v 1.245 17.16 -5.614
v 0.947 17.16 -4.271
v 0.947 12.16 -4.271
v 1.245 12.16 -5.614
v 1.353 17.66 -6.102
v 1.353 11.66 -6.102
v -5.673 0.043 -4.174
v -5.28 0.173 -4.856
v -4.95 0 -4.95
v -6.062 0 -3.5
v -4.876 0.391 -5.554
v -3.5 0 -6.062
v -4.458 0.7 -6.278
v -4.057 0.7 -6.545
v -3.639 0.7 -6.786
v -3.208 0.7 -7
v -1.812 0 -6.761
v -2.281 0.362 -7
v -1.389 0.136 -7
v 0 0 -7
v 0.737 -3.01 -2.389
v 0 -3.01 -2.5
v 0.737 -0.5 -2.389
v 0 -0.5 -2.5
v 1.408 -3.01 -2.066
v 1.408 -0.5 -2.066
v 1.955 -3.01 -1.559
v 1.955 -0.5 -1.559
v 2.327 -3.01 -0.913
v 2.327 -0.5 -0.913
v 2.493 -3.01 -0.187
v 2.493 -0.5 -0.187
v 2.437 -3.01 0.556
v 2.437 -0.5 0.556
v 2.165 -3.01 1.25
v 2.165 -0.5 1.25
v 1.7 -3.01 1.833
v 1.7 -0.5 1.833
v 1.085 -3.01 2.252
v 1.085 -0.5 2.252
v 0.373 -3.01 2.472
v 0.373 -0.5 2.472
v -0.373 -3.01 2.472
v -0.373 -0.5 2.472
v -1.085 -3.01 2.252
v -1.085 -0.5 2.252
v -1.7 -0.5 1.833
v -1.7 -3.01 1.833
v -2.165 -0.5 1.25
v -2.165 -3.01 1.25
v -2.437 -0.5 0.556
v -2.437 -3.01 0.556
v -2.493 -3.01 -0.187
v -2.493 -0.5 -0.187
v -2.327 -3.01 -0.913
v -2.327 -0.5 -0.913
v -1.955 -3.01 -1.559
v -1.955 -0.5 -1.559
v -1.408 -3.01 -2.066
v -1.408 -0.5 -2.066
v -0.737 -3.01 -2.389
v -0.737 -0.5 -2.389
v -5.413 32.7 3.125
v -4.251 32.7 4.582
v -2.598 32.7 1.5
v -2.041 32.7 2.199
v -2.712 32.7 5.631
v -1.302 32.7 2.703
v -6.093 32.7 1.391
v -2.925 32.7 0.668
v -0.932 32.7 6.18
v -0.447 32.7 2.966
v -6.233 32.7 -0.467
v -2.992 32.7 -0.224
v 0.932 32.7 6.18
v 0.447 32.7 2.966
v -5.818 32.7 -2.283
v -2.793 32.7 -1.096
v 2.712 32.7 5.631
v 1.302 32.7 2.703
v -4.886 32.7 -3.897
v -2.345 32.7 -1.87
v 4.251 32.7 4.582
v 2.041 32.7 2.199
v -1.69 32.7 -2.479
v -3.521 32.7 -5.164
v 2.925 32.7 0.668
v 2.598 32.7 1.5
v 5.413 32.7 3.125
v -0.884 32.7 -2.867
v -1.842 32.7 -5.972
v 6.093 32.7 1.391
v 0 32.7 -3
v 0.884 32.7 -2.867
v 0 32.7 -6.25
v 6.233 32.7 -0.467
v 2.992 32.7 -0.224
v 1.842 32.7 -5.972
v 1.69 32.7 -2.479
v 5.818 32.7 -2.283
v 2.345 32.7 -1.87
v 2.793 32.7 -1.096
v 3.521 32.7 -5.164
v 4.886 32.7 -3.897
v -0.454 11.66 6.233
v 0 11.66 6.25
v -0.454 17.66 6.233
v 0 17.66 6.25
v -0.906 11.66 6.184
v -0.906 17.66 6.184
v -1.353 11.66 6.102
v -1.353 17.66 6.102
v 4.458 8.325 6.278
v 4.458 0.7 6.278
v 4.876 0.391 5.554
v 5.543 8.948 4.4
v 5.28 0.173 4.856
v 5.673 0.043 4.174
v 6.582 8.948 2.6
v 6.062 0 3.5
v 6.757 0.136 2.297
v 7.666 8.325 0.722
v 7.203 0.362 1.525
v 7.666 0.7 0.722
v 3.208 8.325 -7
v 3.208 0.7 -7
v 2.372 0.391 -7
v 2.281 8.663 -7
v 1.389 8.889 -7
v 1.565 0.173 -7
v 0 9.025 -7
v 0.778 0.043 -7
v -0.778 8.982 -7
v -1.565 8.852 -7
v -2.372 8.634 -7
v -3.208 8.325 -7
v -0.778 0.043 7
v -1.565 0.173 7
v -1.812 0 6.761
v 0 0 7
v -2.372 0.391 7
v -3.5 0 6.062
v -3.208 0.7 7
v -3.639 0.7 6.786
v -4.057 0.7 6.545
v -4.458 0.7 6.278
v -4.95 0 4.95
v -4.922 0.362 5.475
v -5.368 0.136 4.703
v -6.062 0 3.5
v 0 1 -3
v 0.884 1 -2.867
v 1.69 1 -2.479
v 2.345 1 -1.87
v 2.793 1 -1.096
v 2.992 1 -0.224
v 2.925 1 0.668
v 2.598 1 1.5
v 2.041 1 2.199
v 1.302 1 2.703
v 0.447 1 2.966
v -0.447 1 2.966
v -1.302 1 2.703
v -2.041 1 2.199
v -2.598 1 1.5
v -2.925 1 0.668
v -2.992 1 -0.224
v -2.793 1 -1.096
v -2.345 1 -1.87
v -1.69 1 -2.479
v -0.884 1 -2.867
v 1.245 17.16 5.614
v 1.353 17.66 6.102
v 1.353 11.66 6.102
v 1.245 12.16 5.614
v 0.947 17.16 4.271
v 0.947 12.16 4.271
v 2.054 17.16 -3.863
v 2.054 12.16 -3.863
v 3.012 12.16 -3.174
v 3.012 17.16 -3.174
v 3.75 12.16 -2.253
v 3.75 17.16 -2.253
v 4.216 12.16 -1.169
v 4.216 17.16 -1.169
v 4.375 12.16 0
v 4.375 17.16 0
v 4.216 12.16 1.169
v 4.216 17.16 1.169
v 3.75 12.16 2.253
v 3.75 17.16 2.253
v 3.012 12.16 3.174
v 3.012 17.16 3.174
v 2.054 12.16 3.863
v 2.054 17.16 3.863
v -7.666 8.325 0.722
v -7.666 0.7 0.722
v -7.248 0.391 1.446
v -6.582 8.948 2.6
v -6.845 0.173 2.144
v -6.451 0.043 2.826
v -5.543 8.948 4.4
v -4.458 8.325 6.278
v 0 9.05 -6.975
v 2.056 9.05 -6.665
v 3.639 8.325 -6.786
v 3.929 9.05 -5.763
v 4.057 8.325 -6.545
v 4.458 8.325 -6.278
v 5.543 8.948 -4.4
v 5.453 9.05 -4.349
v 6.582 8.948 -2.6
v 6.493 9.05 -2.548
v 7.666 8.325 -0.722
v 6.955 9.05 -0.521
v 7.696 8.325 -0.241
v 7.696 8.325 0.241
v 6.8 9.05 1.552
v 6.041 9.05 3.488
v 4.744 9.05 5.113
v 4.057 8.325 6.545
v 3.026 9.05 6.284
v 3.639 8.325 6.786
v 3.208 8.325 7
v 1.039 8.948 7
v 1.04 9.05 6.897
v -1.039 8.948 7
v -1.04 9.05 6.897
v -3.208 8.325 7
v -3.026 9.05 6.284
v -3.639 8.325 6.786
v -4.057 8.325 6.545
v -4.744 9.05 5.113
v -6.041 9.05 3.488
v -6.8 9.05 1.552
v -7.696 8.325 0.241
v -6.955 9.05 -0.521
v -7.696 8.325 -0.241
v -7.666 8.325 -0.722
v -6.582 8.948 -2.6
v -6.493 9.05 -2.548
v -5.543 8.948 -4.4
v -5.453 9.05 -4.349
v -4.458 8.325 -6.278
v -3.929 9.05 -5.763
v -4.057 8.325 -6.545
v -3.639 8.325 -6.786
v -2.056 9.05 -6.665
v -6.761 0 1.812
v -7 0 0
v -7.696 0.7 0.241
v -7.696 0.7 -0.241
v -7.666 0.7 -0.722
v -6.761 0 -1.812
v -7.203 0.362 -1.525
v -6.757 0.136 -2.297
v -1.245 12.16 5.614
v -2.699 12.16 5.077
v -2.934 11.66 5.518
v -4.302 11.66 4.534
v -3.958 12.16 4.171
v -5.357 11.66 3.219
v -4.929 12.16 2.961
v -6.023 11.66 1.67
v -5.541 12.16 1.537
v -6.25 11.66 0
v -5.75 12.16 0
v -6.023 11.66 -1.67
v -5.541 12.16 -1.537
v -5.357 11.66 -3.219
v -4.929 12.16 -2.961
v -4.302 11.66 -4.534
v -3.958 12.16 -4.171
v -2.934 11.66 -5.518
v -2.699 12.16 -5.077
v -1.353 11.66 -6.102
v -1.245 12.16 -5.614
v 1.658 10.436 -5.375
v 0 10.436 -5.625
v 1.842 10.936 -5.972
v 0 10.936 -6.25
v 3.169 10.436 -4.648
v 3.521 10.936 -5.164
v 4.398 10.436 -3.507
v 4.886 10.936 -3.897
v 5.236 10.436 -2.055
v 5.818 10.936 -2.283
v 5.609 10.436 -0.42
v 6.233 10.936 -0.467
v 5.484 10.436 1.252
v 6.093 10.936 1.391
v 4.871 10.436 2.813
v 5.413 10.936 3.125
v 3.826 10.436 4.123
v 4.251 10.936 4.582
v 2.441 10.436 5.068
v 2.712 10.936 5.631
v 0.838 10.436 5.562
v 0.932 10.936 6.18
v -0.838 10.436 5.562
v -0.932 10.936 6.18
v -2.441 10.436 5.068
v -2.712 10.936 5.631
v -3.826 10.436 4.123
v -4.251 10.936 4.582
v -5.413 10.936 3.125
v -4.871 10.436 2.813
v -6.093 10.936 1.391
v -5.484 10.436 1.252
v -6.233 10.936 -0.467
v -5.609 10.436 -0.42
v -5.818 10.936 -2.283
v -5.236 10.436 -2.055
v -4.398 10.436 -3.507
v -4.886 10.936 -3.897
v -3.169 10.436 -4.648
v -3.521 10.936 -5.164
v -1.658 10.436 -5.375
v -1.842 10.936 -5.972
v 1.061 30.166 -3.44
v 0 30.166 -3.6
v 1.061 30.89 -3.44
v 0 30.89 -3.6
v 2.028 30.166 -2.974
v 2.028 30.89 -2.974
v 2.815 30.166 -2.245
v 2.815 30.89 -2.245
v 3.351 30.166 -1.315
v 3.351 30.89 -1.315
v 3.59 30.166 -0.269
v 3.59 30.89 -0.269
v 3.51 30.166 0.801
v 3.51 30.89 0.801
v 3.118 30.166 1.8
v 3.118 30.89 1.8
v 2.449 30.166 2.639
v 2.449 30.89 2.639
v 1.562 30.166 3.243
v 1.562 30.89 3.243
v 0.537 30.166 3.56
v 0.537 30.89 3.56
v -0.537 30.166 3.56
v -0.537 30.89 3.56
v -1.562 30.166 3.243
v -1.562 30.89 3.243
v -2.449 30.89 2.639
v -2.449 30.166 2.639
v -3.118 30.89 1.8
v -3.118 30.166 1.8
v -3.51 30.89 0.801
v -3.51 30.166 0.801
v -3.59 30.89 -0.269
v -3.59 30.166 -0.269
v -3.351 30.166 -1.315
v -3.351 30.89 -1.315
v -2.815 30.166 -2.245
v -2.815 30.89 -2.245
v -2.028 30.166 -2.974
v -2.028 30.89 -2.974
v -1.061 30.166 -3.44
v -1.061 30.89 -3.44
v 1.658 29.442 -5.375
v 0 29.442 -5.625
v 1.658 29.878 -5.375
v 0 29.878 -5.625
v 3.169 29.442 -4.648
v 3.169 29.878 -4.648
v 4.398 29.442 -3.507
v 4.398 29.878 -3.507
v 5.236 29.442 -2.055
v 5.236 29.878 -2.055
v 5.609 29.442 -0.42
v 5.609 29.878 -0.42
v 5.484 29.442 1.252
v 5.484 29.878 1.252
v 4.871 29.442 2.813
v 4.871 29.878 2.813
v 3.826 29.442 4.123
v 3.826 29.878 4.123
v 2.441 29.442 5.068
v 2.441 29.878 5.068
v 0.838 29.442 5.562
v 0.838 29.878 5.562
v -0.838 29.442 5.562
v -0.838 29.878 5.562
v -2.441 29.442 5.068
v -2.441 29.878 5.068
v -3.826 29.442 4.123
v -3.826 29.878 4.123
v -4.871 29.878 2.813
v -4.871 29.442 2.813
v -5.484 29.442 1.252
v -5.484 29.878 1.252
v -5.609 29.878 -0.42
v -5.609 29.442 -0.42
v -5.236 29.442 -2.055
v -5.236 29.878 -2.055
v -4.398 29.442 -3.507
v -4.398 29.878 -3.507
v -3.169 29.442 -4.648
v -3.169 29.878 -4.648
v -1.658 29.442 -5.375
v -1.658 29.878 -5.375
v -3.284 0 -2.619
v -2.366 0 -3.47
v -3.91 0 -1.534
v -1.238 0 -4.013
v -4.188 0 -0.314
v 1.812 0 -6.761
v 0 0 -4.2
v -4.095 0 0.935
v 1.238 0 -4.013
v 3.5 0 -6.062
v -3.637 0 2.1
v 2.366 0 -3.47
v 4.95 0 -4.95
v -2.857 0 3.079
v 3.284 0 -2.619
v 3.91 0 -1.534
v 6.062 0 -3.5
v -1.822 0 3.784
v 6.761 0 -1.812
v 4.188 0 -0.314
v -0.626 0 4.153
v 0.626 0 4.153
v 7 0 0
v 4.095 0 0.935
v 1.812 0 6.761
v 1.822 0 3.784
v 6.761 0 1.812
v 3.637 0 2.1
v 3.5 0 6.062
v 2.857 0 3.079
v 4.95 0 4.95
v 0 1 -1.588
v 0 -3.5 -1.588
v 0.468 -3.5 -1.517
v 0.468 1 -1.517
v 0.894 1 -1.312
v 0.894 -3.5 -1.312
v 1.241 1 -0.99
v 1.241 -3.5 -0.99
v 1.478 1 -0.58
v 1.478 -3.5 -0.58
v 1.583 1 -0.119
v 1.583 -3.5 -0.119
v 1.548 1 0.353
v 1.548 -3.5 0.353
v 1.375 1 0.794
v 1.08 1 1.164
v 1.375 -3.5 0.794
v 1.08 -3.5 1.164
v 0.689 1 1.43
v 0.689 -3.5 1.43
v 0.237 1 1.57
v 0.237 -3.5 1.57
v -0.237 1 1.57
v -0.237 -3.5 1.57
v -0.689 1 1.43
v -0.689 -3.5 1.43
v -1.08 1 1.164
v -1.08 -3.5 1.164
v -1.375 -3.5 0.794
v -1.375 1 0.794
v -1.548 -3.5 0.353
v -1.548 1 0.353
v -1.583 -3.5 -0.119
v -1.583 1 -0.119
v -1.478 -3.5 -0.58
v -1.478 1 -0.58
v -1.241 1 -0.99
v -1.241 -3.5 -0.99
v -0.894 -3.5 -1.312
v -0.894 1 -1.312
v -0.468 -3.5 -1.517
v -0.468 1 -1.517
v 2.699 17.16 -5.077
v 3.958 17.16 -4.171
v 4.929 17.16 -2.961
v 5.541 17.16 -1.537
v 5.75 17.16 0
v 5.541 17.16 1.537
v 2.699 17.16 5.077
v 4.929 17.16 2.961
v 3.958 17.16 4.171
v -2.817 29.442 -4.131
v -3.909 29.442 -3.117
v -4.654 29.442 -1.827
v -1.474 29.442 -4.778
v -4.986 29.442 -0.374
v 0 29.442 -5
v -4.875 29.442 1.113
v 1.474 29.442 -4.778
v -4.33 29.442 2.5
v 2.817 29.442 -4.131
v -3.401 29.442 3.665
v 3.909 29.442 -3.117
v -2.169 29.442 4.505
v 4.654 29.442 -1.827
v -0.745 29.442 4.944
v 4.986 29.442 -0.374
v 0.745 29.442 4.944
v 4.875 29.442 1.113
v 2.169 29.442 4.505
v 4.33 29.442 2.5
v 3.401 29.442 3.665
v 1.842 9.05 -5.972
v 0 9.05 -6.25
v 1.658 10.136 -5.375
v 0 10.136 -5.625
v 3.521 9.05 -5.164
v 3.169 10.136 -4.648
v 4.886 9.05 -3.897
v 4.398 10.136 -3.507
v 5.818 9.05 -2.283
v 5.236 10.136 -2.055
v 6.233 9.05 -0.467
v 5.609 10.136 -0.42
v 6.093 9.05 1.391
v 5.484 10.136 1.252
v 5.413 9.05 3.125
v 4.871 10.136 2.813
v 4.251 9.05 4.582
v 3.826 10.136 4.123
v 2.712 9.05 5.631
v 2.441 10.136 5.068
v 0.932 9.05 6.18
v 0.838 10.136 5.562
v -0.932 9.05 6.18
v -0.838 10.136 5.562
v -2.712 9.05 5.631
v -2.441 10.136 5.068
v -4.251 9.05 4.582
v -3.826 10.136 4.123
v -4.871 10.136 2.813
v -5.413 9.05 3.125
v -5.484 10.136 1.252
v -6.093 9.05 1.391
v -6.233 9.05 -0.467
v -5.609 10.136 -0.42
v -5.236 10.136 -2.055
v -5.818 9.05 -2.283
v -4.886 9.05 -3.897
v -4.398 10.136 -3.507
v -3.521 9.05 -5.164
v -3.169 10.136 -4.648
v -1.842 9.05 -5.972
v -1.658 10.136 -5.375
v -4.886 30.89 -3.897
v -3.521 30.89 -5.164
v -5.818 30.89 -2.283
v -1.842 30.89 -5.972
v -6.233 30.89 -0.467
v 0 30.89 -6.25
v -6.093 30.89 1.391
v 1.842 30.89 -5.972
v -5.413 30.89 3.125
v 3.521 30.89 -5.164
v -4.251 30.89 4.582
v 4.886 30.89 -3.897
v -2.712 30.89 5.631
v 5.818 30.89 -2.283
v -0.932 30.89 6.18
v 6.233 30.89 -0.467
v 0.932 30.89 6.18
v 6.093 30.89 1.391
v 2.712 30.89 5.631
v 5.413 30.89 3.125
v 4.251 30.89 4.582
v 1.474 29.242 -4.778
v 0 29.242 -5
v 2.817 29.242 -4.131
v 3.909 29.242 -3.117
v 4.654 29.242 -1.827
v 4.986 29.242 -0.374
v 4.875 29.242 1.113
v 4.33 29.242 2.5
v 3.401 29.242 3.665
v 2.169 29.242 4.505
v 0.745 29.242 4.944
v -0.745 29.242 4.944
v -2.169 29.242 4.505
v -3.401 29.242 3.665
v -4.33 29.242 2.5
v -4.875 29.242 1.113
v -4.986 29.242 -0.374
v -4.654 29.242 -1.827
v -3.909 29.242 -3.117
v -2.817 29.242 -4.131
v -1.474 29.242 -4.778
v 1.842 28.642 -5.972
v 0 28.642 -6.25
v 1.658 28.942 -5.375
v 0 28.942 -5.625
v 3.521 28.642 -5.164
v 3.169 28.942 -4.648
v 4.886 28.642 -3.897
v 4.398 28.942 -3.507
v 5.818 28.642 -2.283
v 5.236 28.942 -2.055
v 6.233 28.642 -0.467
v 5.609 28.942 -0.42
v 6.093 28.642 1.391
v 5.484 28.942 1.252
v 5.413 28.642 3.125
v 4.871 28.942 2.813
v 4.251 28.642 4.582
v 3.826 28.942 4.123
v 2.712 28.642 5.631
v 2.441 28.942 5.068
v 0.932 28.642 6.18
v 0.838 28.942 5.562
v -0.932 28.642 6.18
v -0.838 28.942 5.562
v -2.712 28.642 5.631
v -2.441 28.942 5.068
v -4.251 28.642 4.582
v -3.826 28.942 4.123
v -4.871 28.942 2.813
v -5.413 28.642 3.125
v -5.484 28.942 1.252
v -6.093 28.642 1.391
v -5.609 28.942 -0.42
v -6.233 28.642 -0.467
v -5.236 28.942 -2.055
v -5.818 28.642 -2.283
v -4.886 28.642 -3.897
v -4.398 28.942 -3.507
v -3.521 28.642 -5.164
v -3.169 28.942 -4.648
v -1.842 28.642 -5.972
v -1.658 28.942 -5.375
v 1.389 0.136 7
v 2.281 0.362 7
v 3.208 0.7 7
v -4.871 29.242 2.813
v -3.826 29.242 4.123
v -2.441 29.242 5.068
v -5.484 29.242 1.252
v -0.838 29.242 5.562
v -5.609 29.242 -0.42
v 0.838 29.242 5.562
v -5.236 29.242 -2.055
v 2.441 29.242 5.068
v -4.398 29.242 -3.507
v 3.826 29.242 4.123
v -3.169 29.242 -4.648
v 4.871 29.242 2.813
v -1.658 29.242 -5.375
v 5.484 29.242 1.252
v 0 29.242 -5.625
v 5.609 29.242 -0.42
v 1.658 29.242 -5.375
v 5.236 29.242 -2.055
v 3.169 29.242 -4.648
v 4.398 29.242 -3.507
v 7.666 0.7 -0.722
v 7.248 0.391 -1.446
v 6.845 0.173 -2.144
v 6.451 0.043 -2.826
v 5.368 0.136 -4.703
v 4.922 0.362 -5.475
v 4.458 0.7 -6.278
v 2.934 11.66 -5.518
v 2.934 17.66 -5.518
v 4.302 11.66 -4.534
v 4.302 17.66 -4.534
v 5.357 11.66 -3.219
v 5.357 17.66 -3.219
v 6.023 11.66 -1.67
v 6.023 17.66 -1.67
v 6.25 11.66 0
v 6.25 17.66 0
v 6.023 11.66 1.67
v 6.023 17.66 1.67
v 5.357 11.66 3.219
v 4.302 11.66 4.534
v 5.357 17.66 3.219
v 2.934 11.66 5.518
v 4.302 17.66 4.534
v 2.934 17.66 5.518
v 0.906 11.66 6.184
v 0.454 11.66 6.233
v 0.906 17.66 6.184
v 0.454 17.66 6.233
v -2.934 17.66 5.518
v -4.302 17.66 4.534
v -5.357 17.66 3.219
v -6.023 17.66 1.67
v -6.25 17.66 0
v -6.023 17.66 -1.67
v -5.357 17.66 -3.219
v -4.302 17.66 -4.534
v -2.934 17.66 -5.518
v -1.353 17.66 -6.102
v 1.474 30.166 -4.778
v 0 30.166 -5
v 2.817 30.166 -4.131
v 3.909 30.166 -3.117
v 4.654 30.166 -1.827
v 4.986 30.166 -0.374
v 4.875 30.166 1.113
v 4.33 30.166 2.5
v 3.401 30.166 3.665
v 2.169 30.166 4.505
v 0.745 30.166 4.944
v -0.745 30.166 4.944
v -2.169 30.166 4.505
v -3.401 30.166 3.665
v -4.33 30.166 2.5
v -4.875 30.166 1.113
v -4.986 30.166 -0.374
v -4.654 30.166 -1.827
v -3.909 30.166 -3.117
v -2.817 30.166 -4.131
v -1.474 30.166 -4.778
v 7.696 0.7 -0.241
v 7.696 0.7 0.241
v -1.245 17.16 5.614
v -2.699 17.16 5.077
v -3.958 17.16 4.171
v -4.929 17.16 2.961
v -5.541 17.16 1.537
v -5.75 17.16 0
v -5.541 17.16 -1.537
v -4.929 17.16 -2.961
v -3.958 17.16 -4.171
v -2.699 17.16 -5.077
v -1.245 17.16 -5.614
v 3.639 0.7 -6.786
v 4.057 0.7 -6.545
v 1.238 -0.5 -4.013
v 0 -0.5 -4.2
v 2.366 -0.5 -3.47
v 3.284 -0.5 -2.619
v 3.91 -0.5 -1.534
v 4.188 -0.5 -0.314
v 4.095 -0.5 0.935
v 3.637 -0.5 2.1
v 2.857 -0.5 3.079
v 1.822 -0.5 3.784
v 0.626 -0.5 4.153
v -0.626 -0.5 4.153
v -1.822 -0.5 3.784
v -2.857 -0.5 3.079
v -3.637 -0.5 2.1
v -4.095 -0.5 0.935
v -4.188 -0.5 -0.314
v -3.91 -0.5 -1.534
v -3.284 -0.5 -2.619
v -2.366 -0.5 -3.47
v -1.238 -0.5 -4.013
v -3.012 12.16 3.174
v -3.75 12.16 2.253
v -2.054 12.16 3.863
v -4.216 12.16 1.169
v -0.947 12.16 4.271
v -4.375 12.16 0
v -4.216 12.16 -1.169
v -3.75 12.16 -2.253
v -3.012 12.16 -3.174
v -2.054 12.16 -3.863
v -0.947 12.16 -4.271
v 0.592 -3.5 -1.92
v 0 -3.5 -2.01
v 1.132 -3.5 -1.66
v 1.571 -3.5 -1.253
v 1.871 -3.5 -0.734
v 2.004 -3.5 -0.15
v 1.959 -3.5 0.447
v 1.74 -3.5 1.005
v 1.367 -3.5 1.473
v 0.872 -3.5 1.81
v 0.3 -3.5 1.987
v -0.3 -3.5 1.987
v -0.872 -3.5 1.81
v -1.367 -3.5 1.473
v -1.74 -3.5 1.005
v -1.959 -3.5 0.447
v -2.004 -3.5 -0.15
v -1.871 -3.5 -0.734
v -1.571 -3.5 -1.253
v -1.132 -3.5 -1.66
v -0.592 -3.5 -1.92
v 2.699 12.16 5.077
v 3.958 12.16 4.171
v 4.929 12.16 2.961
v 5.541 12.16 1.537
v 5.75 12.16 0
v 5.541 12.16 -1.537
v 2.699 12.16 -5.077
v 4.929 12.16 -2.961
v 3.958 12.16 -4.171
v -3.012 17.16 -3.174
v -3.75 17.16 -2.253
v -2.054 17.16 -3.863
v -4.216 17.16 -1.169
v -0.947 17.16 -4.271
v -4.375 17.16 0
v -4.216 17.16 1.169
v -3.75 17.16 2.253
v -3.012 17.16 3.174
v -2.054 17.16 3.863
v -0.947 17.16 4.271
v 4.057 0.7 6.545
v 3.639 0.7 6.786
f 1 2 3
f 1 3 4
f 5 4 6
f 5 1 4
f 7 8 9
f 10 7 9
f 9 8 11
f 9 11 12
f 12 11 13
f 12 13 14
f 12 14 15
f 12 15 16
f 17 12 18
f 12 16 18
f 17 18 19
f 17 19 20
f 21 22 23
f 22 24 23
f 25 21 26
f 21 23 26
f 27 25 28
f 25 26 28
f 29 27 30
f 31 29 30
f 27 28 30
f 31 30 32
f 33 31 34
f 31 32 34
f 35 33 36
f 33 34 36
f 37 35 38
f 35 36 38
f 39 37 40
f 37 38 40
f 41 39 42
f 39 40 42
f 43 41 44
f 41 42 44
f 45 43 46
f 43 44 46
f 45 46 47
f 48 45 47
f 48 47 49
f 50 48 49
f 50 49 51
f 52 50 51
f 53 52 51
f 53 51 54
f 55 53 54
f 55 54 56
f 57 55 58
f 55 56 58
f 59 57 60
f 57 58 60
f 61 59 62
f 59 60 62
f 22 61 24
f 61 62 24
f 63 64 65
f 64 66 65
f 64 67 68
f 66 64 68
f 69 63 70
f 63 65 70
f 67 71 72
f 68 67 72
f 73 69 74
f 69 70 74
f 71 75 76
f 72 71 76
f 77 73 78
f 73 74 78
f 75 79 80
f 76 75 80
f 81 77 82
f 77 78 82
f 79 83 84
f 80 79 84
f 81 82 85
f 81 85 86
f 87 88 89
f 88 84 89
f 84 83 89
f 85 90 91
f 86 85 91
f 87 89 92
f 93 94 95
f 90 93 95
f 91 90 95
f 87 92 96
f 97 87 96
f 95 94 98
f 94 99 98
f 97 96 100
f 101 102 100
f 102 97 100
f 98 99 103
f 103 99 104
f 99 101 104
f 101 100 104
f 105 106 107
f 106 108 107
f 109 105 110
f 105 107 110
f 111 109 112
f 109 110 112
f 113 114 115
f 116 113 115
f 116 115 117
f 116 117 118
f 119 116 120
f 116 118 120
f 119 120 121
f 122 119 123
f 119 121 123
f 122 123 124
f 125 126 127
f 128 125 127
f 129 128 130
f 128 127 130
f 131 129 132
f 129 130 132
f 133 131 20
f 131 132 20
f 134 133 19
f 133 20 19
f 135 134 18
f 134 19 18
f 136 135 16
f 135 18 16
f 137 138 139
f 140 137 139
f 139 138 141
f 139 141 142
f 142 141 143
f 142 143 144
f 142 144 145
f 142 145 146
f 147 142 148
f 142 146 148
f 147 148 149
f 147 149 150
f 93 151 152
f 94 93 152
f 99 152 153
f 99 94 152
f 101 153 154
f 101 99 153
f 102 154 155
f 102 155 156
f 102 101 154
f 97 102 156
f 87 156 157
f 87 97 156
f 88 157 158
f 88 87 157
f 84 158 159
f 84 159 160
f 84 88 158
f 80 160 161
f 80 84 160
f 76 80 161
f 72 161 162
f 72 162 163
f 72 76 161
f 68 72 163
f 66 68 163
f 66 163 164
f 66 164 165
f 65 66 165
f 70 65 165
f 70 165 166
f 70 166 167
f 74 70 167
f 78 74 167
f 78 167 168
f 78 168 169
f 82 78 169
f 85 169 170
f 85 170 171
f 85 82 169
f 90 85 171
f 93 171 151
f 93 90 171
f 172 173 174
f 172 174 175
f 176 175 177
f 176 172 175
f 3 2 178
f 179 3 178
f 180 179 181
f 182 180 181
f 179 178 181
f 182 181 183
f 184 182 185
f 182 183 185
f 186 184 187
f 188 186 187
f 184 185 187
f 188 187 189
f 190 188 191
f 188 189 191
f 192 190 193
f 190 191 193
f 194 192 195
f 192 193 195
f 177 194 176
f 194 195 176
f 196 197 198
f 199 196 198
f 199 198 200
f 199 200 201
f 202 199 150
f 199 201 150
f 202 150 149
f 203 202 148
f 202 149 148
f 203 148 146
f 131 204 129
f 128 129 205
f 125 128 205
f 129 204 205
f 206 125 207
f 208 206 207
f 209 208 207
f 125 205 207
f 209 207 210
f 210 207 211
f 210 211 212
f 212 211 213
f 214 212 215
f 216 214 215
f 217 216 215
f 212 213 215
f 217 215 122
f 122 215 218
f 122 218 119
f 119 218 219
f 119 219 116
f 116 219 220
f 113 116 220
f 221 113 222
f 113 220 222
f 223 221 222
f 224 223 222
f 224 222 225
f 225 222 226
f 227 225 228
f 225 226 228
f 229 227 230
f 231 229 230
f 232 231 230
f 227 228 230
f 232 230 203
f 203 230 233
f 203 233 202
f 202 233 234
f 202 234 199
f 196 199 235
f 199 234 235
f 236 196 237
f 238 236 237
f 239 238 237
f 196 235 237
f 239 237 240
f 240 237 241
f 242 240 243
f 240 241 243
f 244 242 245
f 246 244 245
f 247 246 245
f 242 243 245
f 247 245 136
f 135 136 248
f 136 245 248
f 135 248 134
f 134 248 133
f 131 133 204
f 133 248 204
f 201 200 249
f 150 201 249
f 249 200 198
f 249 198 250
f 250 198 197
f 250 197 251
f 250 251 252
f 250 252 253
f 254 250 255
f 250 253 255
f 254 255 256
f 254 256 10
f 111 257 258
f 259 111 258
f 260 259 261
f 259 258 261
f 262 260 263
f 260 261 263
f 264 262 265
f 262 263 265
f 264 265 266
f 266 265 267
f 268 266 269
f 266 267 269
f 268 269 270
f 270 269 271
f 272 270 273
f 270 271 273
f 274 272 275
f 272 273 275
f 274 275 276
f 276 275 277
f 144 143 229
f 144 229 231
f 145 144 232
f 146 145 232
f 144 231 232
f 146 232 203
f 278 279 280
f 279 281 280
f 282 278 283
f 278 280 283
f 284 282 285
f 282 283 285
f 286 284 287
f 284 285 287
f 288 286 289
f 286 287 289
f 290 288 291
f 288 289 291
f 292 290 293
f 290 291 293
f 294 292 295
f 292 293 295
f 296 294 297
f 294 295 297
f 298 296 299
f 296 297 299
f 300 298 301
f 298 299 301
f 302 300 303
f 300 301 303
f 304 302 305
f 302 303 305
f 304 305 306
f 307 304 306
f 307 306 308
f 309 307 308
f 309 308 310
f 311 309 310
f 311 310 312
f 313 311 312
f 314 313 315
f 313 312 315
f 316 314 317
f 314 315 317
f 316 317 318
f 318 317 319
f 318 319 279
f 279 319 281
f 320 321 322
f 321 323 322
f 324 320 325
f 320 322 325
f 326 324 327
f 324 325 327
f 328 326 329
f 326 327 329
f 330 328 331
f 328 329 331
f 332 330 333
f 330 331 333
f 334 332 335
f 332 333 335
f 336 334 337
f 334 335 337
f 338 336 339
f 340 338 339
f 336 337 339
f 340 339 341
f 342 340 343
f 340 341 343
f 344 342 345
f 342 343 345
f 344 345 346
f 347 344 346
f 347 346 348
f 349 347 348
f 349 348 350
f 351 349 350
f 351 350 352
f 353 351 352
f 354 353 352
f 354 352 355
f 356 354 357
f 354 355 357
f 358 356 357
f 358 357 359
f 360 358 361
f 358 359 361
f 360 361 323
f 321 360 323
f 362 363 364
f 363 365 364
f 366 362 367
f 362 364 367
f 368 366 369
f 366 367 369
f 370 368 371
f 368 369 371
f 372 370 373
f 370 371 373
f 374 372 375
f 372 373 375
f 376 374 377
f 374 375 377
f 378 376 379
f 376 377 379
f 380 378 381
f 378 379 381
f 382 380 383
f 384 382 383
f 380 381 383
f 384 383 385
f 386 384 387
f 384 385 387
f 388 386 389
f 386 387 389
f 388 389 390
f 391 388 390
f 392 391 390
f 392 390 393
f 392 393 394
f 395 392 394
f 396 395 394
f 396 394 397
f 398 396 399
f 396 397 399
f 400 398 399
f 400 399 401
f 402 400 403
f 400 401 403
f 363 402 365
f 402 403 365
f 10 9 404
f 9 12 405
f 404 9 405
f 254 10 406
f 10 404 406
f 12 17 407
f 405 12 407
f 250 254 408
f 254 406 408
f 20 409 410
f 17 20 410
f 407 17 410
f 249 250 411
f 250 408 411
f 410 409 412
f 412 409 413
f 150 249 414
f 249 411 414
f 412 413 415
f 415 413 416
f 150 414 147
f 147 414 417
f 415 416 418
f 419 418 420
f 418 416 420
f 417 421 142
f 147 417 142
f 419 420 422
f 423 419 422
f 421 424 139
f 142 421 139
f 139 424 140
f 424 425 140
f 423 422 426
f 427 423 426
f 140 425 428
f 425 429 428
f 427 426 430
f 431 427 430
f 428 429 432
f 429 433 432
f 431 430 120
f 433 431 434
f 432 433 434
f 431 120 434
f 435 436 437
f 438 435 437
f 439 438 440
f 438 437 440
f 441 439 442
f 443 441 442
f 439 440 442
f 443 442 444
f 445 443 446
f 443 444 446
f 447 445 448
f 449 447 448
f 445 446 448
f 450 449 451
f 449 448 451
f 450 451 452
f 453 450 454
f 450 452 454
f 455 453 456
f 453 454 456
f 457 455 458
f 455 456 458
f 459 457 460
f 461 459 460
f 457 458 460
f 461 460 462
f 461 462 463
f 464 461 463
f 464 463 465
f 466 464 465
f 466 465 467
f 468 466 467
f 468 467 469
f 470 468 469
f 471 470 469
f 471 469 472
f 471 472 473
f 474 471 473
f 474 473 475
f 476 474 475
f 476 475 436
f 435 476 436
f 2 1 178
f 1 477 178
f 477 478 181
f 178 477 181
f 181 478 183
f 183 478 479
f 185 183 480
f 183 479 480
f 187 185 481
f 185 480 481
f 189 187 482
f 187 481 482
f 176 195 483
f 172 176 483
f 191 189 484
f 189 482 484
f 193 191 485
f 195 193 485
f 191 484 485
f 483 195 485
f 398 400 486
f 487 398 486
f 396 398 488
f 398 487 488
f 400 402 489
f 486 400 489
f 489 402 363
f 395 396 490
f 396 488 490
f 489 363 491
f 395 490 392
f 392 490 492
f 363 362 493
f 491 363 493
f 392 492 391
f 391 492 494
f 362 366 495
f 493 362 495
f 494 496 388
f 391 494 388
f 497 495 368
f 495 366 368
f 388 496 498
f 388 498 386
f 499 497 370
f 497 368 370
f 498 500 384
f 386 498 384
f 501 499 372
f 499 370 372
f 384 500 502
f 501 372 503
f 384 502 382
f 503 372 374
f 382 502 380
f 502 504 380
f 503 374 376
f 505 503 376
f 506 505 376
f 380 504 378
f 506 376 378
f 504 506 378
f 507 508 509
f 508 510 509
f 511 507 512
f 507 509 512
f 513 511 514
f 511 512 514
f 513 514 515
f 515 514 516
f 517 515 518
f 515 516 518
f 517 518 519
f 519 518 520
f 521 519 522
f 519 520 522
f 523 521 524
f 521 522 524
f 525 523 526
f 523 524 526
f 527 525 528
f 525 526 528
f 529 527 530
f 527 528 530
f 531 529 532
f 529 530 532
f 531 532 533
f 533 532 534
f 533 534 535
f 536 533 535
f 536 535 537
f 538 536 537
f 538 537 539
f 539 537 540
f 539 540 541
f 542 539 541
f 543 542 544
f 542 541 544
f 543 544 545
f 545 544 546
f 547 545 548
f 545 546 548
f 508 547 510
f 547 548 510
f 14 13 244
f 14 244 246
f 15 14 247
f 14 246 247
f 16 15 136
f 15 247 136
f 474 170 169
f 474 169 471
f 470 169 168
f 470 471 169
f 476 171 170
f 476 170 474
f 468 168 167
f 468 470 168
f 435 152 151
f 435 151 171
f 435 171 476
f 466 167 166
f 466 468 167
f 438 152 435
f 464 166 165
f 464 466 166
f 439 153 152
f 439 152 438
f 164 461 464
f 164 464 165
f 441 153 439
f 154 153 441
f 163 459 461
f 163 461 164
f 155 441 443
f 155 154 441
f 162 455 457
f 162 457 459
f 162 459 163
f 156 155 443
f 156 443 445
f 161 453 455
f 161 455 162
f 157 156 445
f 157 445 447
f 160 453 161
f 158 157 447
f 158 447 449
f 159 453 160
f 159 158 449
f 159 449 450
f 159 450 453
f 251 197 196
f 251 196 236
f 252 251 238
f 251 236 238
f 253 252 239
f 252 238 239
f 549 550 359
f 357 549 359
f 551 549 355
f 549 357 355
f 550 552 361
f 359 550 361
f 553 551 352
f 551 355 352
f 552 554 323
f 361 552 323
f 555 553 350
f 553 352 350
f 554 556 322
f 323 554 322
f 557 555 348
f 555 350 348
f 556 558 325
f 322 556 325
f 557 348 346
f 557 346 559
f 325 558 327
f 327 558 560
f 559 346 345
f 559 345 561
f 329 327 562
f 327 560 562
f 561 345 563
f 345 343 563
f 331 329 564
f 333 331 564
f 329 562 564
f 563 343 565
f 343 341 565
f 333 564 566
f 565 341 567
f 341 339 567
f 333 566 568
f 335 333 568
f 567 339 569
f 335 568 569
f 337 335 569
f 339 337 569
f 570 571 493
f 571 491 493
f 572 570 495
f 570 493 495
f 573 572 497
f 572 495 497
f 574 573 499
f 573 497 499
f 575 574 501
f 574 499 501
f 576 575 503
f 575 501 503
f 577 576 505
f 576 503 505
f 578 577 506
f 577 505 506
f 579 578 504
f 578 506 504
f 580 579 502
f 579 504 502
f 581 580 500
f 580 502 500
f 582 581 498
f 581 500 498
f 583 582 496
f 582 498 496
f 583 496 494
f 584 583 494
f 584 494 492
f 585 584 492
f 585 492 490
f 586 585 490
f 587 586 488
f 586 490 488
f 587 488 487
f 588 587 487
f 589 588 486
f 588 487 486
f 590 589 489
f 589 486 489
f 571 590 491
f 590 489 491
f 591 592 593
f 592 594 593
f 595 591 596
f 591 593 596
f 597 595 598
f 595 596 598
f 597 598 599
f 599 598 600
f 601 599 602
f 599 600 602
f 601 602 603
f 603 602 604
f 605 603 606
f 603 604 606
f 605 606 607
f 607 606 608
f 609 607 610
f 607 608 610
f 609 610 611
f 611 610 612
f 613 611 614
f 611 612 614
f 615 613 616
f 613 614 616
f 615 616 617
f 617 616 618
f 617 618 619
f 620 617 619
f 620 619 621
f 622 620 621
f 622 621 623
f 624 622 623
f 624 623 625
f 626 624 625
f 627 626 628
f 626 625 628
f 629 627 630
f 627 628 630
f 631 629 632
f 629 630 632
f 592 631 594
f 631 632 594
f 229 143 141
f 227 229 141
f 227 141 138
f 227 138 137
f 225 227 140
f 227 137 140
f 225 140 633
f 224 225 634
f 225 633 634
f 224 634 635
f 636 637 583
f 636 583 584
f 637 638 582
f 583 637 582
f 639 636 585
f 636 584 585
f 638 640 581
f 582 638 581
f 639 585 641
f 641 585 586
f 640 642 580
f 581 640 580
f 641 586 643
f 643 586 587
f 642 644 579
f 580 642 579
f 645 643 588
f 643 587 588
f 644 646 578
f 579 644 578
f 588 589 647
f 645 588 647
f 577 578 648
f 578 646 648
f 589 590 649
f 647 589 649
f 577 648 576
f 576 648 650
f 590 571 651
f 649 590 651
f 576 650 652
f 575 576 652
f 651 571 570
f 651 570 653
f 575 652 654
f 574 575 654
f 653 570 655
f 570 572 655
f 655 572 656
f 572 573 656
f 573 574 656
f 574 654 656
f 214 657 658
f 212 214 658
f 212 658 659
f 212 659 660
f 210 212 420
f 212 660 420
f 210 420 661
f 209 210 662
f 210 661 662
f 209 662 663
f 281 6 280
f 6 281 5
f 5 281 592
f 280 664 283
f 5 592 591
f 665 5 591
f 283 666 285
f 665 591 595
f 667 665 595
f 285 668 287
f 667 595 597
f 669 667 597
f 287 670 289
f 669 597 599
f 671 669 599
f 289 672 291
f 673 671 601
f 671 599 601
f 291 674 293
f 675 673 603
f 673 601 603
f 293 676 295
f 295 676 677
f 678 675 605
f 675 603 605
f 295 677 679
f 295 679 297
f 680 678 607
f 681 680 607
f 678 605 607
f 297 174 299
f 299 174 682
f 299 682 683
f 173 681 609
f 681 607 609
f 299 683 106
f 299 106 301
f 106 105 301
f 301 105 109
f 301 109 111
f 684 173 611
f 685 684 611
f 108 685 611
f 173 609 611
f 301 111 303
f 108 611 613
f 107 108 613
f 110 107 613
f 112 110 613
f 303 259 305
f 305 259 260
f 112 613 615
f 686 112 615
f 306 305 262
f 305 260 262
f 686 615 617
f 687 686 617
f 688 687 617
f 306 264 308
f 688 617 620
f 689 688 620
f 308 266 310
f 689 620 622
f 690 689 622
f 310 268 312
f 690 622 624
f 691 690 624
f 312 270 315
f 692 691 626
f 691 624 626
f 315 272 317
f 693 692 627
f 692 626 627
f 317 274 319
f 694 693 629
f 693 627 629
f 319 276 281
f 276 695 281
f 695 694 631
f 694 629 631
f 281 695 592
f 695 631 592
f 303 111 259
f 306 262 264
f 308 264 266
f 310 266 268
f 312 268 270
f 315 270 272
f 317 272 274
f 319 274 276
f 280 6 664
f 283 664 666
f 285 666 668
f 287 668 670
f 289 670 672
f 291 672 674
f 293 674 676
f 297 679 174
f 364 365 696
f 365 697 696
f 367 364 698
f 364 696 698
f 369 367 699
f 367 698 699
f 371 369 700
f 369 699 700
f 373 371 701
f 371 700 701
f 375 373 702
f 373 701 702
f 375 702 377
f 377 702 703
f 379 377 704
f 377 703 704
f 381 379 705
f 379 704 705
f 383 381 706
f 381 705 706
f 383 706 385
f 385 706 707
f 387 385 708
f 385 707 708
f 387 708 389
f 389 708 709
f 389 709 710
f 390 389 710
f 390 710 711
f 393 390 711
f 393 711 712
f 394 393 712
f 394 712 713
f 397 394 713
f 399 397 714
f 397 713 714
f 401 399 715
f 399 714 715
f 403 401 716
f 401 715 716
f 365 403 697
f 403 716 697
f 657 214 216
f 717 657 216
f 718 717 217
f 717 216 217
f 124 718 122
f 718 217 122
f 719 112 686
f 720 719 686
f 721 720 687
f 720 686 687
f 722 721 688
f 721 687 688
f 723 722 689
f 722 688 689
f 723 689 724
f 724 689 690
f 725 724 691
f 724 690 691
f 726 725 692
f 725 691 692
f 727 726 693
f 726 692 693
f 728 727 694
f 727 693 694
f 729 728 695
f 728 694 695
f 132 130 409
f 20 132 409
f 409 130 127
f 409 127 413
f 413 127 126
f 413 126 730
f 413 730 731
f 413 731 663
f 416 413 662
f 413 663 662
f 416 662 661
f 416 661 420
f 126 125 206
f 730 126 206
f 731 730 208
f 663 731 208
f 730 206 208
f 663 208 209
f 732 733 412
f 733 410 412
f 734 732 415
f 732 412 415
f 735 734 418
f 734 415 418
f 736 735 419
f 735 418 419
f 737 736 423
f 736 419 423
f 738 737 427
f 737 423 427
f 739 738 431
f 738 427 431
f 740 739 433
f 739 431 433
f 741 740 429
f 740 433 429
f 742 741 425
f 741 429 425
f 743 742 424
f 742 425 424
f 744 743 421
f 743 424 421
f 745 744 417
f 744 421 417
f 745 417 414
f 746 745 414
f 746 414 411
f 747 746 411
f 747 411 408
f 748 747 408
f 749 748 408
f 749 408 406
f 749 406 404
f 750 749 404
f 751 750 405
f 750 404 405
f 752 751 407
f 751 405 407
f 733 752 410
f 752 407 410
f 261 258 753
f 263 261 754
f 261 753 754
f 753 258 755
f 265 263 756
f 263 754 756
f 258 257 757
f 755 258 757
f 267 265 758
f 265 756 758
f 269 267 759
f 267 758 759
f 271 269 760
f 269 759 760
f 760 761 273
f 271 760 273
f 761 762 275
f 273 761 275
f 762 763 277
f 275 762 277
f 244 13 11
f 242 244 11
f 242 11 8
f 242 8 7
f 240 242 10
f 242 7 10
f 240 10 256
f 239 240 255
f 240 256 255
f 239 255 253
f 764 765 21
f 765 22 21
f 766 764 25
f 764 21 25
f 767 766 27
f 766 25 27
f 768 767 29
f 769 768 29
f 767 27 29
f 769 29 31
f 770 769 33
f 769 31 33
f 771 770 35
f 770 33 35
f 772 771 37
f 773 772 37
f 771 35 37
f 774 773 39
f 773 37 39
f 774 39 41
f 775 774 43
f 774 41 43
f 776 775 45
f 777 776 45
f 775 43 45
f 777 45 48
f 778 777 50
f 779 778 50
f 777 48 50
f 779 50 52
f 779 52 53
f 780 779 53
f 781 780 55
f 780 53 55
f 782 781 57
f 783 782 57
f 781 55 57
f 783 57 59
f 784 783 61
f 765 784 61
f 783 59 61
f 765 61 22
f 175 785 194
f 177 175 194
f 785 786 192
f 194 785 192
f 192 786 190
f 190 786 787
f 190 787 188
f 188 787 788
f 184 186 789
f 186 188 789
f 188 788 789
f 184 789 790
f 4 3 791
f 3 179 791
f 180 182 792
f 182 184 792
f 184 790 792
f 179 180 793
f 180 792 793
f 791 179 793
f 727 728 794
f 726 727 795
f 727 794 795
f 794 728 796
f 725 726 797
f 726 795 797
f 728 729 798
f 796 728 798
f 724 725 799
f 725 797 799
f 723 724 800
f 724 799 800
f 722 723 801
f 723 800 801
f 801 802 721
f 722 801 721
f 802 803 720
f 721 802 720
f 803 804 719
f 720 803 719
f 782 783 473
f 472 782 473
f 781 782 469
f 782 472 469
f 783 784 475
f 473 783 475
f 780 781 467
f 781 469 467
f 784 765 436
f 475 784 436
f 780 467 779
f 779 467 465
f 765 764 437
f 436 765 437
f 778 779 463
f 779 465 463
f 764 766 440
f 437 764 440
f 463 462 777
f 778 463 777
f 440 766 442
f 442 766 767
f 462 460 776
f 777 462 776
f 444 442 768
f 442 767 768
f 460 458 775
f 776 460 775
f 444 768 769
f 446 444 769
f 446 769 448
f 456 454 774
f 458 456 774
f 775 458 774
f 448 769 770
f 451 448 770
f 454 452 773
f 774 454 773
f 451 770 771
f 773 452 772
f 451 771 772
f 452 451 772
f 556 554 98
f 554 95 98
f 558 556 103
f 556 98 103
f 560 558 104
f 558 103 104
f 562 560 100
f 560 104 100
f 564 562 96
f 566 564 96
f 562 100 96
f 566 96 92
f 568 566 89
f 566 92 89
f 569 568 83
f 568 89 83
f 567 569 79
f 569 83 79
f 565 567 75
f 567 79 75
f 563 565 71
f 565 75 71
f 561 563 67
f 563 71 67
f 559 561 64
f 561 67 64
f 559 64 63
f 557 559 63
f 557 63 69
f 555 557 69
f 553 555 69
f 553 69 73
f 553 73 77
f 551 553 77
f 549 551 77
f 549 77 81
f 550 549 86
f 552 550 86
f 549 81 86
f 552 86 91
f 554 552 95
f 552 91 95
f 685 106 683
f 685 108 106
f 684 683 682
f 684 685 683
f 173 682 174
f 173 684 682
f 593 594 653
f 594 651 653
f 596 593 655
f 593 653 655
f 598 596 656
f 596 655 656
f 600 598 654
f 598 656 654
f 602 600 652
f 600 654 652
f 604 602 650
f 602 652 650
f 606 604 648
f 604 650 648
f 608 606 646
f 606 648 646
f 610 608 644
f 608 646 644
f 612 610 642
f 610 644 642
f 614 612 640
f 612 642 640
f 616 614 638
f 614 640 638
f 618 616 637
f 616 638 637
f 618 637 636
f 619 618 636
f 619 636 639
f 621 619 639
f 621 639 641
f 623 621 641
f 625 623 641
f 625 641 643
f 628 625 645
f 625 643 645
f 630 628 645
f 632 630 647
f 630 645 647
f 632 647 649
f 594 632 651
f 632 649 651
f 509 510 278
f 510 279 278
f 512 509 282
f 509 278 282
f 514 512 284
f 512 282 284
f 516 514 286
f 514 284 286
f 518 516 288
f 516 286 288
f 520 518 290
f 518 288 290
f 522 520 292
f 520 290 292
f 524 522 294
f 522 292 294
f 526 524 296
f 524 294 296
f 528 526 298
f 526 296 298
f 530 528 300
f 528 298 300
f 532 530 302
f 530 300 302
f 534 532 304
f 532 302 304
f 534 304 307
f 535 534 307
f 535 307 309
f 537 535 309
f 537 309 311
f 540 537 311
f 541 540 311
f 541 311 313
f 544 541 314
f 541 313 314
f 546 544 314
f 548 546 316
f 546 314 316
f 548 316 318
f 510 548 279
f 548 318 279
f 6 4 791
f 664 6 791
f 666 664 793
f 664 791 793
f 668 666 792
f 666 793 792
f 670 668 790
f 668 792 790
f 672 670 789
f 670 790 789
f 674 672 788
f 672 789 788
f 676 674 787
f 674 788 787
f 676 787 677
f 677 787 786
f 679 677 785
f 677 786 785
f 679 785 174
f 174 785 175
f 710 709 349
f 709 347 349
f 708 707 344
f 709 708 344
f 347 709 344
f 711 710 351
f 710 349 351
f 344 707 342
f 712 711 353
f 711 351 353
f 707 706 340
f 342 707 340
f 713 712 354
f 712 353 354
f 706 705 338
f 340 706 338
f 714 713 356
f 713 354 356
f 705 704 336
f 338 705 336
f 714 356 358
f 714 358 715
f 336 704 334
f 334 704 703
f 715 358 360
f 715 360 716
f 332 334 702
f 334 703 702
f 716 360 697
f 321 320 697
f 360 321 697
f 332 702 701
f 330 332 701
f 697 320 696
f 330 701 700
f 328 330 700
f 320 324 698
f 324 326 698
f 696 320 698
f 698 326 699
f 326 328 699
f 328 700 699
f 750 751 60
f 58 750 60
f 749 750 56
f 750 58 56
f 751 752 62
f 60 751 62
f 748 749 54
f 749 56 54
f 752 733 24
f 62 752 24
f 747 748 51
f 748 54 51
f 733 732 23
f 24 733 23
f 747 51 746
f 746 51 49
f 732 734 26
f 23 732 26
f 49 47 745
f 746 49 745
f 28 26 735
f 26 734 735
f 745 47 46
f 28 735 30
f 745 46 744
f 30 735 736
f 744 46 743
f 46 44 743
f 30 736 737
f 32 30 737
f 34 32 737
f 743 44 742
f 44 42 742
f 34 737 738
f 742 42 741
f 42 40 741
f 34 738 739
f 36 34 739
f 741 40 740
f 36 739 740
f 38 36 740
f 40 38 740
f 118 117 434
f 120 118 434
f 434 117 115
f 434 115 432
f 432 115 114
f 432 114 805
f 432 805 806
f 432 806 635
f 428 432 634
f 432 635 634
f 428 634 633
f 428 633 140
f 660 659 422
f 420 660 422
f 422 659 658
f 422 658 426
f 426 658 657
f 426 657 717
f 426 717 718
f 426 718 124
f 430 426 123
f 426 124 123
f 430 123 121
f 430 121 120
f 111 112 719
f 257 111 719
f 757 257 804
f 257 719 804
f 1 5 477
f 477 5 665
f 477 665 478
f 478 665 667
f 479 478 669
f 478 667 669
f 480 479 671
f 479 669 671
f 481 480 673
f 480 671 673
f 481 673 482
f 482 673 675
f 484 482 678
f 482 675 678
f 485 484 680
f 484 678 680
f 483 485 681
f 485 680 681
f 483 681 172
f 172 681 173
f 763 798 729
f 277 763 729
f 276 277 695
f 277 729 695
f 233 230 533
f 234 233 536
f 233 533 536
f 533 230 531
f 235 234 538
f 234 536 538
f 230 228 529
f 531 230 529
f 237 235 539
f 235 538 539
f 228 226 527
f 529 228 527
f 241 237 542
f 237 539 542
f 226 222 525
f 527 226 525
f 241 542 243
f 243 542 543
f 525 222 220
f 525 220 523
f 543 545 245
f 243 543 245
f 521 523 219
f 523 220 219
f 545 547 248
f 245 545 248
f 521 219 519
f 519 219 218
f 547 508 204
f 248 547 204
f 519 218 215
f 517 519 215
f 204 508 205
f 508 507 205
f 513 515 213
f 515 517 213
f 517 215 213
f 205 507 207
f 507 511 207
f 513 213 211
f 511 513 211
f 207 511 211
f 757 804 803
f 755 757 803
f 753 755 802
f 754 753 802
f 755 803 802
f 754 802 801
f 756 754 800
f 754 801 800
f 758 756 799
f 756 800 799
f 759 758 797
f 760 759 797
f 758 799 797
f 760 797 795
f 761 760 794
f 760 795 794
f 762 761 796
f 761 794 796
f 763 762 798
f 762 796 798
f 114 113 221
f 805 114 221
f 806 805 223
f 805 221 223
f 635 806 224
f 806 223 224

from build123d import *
from build123d.topology import SkipClean

# Parameters (mm, degrees)
SKETCH4_W                = 28
SKETCH4_H                = 28
CUT_EXTRUDE1_DEPTH       = 9.05
SKETCH5_W                = 2.5
SKETCH5_H                = 6
REVOLVE3_ANGLE           = 12.5
REVOLVE3_OTHER_WAY_ANGLE = 12.5
SKETCH6_W                = 2.5
SKETCH6_H                = 6
REVOLVE4_ANGLE           = 12.5
REVOLVE4_OTHER_WAY_ANGLE = 12.5
SKETCH7_R                = 1.5875
CUT_EXTRUDE2_DEPTH       = 38.666032443


with BuildPart() as part:
    # Sketch1 → Revolve1 (revolve)
    with BuildSketch(Plane.XY):
        Polygon((0, 0), (-7, 0), (-7.7, 0.7), (-7.7, 8.325), (-6.975, 9.05), (-6.25, 9.05), (-5.625, 10.136), (-5.625, 10.436), (-6.25, 10.936), (-6.25, 11.66), (-5.75, 12.16), (-4.375, 12.16), (-4.375, 17.16), (-5.75, 17.16), (-6.25, 17.66), (-6.25, 28.642), (-5.625, 28.942), (-5.625, 29.242), (-5, 29.242), (-5, 29.442), (-5.625, 29.442), (-5.625, 29.877538462), (-5, 30.166), (-3.6, 30.166), (-3.6, 30.89), (-6.25, 30.89), (-6.25, 32.7), (0, 32.7), align=None)
    revolve(axis=Axis((0, 32.7, 0), (0, -1, 0)))

    # Sketch2 → Revolve2 (revolve)
    with BuildSketch(Plane.XY):
        Polygon((0, -3.5), (-2.0095, -3.5), (-2.5, -3.0095), (-2.5, -0.5), (-4.2, -0.5), (-4.2, 0), (0, 0), align=None)
    revolve(axis=Axis((0, 0, 0), (0, -1, 0)))

    # Sketch3 → Cut-Revolve1 (revolve, cut)
    with BuildSketch(Plane.XY):
        Polygon((0, -3.5), (-1.25, -3.5), (-1.25, 1), (-3, 1), (-3, 32.7), (0, 32.7), align=None)
    revolve(axis=Axis((0, 32.7, 0), (0, -1, 0)), mode=Mode.SUBTRACT)

    # Sketch4 → Cut-Extrude1 (cut)
    with BuildSketch(Plane(origin=(0, 0, 0), x_dir=(-1, 0, 0), z_dir=(0, 1, 0))):
        Rectangle(SKETCH4_W, SKETCH4_H)
        Polygon((8.082903769, 0), (4.041451884, 7), (-4.041451884, 7), (-8.082903769, 0), (-4.041451884, -7), (4.041451884, -7), align=None, mode=Mode.SUBTRACT)
    extrude(amount=CUT_EXTRUDE1_DEPTH, mode=Mode.SUBTRACT)

    # Sketch5 → Revolve3 (revolve)
    with SkipClean():  # the faces are left unmerged after this step: merging them gives an invalid solid
        with BuildSketch(Plane(origin=(0, 0, 0), x_dir=(0, 0, -1), z_dir=(1, 0, 0))):
            with Locations((5, 14.66)):
                Rectangle(SKETCH5_W, SKETCH5_H)
        revolve(axis=Axis((0, 11.66, 0), (0, 1, 0)), revolution_arc=REVOLVE3_ANGLE)

    # Sketch5 → Revolve3 other way (revolve)
    with SkipClean():  # the faces are left unmerged after this step: merging them gives an invalid solid
        with BuildSketch(Plane(origin=(0, 0, 0), x_dir=(0, 0, -1), z_dir=(1, 0, 0))):
            with Locations((5, 14.66)):
                Rectangle(SKETCH5_W, SKETCH5_H)
        revolve(axis=Axis((0, 11.66, 0), (0, -1, 0)), revolution_arc=REVOLVE3_OTHER_WAY_ANGLE)

    # Sketch6 → Revolve4 (revolve)
    with SkipClean():  # the faces are left unmerged after this step: merging them gives an invalid solid
        with BuildSketch(Plane(origin=(0, 0, 0), x_dir=(0, 0, -1), z_dir=(1, 0, 0))):
            with Locations((-5, 14.66)):
                Rectangle(SKETCH6_W, SKETCH6_H)
        revolve(axis=Axis((0, 17.66, 0), (0, -1, 0)), revolution_arc=REVOLVE4_ANGLE)

    # Sketch6 → Revolve4 other way (revolve)
    with SkipClean():  # the faces are left unmerged after this step: merging them gives an invalid solid
        with BuildSketch(Plane(origin=(0, 0, 0), x_dir=(0, 0, -1), z_dir=(1, 0, 0))):
            with Locations((-5, 14.66)):
                Rectangle(SKETCH6_W, SKETCH6_H)
        revolve(axis=Axis((0, 17.66, 0), (0, 1, 0)), revolution_arc=REVOLVE4_OTHER_WAY_ANGLE)

    # Sketch7 → Cut-Extrude2 (cut, through all)
    with SkipClean():  # the faces are left unmerged after this step: merging them gives an invalid solid
        with BuildSketch(Plane.XZ.offset(3.5)):
            Circle(SKETCH7_R)
        extrude(amount=-CUT_EXTRUDE2_DEPTH, mode=Mode.SUBTRACT)


solid = part.part
